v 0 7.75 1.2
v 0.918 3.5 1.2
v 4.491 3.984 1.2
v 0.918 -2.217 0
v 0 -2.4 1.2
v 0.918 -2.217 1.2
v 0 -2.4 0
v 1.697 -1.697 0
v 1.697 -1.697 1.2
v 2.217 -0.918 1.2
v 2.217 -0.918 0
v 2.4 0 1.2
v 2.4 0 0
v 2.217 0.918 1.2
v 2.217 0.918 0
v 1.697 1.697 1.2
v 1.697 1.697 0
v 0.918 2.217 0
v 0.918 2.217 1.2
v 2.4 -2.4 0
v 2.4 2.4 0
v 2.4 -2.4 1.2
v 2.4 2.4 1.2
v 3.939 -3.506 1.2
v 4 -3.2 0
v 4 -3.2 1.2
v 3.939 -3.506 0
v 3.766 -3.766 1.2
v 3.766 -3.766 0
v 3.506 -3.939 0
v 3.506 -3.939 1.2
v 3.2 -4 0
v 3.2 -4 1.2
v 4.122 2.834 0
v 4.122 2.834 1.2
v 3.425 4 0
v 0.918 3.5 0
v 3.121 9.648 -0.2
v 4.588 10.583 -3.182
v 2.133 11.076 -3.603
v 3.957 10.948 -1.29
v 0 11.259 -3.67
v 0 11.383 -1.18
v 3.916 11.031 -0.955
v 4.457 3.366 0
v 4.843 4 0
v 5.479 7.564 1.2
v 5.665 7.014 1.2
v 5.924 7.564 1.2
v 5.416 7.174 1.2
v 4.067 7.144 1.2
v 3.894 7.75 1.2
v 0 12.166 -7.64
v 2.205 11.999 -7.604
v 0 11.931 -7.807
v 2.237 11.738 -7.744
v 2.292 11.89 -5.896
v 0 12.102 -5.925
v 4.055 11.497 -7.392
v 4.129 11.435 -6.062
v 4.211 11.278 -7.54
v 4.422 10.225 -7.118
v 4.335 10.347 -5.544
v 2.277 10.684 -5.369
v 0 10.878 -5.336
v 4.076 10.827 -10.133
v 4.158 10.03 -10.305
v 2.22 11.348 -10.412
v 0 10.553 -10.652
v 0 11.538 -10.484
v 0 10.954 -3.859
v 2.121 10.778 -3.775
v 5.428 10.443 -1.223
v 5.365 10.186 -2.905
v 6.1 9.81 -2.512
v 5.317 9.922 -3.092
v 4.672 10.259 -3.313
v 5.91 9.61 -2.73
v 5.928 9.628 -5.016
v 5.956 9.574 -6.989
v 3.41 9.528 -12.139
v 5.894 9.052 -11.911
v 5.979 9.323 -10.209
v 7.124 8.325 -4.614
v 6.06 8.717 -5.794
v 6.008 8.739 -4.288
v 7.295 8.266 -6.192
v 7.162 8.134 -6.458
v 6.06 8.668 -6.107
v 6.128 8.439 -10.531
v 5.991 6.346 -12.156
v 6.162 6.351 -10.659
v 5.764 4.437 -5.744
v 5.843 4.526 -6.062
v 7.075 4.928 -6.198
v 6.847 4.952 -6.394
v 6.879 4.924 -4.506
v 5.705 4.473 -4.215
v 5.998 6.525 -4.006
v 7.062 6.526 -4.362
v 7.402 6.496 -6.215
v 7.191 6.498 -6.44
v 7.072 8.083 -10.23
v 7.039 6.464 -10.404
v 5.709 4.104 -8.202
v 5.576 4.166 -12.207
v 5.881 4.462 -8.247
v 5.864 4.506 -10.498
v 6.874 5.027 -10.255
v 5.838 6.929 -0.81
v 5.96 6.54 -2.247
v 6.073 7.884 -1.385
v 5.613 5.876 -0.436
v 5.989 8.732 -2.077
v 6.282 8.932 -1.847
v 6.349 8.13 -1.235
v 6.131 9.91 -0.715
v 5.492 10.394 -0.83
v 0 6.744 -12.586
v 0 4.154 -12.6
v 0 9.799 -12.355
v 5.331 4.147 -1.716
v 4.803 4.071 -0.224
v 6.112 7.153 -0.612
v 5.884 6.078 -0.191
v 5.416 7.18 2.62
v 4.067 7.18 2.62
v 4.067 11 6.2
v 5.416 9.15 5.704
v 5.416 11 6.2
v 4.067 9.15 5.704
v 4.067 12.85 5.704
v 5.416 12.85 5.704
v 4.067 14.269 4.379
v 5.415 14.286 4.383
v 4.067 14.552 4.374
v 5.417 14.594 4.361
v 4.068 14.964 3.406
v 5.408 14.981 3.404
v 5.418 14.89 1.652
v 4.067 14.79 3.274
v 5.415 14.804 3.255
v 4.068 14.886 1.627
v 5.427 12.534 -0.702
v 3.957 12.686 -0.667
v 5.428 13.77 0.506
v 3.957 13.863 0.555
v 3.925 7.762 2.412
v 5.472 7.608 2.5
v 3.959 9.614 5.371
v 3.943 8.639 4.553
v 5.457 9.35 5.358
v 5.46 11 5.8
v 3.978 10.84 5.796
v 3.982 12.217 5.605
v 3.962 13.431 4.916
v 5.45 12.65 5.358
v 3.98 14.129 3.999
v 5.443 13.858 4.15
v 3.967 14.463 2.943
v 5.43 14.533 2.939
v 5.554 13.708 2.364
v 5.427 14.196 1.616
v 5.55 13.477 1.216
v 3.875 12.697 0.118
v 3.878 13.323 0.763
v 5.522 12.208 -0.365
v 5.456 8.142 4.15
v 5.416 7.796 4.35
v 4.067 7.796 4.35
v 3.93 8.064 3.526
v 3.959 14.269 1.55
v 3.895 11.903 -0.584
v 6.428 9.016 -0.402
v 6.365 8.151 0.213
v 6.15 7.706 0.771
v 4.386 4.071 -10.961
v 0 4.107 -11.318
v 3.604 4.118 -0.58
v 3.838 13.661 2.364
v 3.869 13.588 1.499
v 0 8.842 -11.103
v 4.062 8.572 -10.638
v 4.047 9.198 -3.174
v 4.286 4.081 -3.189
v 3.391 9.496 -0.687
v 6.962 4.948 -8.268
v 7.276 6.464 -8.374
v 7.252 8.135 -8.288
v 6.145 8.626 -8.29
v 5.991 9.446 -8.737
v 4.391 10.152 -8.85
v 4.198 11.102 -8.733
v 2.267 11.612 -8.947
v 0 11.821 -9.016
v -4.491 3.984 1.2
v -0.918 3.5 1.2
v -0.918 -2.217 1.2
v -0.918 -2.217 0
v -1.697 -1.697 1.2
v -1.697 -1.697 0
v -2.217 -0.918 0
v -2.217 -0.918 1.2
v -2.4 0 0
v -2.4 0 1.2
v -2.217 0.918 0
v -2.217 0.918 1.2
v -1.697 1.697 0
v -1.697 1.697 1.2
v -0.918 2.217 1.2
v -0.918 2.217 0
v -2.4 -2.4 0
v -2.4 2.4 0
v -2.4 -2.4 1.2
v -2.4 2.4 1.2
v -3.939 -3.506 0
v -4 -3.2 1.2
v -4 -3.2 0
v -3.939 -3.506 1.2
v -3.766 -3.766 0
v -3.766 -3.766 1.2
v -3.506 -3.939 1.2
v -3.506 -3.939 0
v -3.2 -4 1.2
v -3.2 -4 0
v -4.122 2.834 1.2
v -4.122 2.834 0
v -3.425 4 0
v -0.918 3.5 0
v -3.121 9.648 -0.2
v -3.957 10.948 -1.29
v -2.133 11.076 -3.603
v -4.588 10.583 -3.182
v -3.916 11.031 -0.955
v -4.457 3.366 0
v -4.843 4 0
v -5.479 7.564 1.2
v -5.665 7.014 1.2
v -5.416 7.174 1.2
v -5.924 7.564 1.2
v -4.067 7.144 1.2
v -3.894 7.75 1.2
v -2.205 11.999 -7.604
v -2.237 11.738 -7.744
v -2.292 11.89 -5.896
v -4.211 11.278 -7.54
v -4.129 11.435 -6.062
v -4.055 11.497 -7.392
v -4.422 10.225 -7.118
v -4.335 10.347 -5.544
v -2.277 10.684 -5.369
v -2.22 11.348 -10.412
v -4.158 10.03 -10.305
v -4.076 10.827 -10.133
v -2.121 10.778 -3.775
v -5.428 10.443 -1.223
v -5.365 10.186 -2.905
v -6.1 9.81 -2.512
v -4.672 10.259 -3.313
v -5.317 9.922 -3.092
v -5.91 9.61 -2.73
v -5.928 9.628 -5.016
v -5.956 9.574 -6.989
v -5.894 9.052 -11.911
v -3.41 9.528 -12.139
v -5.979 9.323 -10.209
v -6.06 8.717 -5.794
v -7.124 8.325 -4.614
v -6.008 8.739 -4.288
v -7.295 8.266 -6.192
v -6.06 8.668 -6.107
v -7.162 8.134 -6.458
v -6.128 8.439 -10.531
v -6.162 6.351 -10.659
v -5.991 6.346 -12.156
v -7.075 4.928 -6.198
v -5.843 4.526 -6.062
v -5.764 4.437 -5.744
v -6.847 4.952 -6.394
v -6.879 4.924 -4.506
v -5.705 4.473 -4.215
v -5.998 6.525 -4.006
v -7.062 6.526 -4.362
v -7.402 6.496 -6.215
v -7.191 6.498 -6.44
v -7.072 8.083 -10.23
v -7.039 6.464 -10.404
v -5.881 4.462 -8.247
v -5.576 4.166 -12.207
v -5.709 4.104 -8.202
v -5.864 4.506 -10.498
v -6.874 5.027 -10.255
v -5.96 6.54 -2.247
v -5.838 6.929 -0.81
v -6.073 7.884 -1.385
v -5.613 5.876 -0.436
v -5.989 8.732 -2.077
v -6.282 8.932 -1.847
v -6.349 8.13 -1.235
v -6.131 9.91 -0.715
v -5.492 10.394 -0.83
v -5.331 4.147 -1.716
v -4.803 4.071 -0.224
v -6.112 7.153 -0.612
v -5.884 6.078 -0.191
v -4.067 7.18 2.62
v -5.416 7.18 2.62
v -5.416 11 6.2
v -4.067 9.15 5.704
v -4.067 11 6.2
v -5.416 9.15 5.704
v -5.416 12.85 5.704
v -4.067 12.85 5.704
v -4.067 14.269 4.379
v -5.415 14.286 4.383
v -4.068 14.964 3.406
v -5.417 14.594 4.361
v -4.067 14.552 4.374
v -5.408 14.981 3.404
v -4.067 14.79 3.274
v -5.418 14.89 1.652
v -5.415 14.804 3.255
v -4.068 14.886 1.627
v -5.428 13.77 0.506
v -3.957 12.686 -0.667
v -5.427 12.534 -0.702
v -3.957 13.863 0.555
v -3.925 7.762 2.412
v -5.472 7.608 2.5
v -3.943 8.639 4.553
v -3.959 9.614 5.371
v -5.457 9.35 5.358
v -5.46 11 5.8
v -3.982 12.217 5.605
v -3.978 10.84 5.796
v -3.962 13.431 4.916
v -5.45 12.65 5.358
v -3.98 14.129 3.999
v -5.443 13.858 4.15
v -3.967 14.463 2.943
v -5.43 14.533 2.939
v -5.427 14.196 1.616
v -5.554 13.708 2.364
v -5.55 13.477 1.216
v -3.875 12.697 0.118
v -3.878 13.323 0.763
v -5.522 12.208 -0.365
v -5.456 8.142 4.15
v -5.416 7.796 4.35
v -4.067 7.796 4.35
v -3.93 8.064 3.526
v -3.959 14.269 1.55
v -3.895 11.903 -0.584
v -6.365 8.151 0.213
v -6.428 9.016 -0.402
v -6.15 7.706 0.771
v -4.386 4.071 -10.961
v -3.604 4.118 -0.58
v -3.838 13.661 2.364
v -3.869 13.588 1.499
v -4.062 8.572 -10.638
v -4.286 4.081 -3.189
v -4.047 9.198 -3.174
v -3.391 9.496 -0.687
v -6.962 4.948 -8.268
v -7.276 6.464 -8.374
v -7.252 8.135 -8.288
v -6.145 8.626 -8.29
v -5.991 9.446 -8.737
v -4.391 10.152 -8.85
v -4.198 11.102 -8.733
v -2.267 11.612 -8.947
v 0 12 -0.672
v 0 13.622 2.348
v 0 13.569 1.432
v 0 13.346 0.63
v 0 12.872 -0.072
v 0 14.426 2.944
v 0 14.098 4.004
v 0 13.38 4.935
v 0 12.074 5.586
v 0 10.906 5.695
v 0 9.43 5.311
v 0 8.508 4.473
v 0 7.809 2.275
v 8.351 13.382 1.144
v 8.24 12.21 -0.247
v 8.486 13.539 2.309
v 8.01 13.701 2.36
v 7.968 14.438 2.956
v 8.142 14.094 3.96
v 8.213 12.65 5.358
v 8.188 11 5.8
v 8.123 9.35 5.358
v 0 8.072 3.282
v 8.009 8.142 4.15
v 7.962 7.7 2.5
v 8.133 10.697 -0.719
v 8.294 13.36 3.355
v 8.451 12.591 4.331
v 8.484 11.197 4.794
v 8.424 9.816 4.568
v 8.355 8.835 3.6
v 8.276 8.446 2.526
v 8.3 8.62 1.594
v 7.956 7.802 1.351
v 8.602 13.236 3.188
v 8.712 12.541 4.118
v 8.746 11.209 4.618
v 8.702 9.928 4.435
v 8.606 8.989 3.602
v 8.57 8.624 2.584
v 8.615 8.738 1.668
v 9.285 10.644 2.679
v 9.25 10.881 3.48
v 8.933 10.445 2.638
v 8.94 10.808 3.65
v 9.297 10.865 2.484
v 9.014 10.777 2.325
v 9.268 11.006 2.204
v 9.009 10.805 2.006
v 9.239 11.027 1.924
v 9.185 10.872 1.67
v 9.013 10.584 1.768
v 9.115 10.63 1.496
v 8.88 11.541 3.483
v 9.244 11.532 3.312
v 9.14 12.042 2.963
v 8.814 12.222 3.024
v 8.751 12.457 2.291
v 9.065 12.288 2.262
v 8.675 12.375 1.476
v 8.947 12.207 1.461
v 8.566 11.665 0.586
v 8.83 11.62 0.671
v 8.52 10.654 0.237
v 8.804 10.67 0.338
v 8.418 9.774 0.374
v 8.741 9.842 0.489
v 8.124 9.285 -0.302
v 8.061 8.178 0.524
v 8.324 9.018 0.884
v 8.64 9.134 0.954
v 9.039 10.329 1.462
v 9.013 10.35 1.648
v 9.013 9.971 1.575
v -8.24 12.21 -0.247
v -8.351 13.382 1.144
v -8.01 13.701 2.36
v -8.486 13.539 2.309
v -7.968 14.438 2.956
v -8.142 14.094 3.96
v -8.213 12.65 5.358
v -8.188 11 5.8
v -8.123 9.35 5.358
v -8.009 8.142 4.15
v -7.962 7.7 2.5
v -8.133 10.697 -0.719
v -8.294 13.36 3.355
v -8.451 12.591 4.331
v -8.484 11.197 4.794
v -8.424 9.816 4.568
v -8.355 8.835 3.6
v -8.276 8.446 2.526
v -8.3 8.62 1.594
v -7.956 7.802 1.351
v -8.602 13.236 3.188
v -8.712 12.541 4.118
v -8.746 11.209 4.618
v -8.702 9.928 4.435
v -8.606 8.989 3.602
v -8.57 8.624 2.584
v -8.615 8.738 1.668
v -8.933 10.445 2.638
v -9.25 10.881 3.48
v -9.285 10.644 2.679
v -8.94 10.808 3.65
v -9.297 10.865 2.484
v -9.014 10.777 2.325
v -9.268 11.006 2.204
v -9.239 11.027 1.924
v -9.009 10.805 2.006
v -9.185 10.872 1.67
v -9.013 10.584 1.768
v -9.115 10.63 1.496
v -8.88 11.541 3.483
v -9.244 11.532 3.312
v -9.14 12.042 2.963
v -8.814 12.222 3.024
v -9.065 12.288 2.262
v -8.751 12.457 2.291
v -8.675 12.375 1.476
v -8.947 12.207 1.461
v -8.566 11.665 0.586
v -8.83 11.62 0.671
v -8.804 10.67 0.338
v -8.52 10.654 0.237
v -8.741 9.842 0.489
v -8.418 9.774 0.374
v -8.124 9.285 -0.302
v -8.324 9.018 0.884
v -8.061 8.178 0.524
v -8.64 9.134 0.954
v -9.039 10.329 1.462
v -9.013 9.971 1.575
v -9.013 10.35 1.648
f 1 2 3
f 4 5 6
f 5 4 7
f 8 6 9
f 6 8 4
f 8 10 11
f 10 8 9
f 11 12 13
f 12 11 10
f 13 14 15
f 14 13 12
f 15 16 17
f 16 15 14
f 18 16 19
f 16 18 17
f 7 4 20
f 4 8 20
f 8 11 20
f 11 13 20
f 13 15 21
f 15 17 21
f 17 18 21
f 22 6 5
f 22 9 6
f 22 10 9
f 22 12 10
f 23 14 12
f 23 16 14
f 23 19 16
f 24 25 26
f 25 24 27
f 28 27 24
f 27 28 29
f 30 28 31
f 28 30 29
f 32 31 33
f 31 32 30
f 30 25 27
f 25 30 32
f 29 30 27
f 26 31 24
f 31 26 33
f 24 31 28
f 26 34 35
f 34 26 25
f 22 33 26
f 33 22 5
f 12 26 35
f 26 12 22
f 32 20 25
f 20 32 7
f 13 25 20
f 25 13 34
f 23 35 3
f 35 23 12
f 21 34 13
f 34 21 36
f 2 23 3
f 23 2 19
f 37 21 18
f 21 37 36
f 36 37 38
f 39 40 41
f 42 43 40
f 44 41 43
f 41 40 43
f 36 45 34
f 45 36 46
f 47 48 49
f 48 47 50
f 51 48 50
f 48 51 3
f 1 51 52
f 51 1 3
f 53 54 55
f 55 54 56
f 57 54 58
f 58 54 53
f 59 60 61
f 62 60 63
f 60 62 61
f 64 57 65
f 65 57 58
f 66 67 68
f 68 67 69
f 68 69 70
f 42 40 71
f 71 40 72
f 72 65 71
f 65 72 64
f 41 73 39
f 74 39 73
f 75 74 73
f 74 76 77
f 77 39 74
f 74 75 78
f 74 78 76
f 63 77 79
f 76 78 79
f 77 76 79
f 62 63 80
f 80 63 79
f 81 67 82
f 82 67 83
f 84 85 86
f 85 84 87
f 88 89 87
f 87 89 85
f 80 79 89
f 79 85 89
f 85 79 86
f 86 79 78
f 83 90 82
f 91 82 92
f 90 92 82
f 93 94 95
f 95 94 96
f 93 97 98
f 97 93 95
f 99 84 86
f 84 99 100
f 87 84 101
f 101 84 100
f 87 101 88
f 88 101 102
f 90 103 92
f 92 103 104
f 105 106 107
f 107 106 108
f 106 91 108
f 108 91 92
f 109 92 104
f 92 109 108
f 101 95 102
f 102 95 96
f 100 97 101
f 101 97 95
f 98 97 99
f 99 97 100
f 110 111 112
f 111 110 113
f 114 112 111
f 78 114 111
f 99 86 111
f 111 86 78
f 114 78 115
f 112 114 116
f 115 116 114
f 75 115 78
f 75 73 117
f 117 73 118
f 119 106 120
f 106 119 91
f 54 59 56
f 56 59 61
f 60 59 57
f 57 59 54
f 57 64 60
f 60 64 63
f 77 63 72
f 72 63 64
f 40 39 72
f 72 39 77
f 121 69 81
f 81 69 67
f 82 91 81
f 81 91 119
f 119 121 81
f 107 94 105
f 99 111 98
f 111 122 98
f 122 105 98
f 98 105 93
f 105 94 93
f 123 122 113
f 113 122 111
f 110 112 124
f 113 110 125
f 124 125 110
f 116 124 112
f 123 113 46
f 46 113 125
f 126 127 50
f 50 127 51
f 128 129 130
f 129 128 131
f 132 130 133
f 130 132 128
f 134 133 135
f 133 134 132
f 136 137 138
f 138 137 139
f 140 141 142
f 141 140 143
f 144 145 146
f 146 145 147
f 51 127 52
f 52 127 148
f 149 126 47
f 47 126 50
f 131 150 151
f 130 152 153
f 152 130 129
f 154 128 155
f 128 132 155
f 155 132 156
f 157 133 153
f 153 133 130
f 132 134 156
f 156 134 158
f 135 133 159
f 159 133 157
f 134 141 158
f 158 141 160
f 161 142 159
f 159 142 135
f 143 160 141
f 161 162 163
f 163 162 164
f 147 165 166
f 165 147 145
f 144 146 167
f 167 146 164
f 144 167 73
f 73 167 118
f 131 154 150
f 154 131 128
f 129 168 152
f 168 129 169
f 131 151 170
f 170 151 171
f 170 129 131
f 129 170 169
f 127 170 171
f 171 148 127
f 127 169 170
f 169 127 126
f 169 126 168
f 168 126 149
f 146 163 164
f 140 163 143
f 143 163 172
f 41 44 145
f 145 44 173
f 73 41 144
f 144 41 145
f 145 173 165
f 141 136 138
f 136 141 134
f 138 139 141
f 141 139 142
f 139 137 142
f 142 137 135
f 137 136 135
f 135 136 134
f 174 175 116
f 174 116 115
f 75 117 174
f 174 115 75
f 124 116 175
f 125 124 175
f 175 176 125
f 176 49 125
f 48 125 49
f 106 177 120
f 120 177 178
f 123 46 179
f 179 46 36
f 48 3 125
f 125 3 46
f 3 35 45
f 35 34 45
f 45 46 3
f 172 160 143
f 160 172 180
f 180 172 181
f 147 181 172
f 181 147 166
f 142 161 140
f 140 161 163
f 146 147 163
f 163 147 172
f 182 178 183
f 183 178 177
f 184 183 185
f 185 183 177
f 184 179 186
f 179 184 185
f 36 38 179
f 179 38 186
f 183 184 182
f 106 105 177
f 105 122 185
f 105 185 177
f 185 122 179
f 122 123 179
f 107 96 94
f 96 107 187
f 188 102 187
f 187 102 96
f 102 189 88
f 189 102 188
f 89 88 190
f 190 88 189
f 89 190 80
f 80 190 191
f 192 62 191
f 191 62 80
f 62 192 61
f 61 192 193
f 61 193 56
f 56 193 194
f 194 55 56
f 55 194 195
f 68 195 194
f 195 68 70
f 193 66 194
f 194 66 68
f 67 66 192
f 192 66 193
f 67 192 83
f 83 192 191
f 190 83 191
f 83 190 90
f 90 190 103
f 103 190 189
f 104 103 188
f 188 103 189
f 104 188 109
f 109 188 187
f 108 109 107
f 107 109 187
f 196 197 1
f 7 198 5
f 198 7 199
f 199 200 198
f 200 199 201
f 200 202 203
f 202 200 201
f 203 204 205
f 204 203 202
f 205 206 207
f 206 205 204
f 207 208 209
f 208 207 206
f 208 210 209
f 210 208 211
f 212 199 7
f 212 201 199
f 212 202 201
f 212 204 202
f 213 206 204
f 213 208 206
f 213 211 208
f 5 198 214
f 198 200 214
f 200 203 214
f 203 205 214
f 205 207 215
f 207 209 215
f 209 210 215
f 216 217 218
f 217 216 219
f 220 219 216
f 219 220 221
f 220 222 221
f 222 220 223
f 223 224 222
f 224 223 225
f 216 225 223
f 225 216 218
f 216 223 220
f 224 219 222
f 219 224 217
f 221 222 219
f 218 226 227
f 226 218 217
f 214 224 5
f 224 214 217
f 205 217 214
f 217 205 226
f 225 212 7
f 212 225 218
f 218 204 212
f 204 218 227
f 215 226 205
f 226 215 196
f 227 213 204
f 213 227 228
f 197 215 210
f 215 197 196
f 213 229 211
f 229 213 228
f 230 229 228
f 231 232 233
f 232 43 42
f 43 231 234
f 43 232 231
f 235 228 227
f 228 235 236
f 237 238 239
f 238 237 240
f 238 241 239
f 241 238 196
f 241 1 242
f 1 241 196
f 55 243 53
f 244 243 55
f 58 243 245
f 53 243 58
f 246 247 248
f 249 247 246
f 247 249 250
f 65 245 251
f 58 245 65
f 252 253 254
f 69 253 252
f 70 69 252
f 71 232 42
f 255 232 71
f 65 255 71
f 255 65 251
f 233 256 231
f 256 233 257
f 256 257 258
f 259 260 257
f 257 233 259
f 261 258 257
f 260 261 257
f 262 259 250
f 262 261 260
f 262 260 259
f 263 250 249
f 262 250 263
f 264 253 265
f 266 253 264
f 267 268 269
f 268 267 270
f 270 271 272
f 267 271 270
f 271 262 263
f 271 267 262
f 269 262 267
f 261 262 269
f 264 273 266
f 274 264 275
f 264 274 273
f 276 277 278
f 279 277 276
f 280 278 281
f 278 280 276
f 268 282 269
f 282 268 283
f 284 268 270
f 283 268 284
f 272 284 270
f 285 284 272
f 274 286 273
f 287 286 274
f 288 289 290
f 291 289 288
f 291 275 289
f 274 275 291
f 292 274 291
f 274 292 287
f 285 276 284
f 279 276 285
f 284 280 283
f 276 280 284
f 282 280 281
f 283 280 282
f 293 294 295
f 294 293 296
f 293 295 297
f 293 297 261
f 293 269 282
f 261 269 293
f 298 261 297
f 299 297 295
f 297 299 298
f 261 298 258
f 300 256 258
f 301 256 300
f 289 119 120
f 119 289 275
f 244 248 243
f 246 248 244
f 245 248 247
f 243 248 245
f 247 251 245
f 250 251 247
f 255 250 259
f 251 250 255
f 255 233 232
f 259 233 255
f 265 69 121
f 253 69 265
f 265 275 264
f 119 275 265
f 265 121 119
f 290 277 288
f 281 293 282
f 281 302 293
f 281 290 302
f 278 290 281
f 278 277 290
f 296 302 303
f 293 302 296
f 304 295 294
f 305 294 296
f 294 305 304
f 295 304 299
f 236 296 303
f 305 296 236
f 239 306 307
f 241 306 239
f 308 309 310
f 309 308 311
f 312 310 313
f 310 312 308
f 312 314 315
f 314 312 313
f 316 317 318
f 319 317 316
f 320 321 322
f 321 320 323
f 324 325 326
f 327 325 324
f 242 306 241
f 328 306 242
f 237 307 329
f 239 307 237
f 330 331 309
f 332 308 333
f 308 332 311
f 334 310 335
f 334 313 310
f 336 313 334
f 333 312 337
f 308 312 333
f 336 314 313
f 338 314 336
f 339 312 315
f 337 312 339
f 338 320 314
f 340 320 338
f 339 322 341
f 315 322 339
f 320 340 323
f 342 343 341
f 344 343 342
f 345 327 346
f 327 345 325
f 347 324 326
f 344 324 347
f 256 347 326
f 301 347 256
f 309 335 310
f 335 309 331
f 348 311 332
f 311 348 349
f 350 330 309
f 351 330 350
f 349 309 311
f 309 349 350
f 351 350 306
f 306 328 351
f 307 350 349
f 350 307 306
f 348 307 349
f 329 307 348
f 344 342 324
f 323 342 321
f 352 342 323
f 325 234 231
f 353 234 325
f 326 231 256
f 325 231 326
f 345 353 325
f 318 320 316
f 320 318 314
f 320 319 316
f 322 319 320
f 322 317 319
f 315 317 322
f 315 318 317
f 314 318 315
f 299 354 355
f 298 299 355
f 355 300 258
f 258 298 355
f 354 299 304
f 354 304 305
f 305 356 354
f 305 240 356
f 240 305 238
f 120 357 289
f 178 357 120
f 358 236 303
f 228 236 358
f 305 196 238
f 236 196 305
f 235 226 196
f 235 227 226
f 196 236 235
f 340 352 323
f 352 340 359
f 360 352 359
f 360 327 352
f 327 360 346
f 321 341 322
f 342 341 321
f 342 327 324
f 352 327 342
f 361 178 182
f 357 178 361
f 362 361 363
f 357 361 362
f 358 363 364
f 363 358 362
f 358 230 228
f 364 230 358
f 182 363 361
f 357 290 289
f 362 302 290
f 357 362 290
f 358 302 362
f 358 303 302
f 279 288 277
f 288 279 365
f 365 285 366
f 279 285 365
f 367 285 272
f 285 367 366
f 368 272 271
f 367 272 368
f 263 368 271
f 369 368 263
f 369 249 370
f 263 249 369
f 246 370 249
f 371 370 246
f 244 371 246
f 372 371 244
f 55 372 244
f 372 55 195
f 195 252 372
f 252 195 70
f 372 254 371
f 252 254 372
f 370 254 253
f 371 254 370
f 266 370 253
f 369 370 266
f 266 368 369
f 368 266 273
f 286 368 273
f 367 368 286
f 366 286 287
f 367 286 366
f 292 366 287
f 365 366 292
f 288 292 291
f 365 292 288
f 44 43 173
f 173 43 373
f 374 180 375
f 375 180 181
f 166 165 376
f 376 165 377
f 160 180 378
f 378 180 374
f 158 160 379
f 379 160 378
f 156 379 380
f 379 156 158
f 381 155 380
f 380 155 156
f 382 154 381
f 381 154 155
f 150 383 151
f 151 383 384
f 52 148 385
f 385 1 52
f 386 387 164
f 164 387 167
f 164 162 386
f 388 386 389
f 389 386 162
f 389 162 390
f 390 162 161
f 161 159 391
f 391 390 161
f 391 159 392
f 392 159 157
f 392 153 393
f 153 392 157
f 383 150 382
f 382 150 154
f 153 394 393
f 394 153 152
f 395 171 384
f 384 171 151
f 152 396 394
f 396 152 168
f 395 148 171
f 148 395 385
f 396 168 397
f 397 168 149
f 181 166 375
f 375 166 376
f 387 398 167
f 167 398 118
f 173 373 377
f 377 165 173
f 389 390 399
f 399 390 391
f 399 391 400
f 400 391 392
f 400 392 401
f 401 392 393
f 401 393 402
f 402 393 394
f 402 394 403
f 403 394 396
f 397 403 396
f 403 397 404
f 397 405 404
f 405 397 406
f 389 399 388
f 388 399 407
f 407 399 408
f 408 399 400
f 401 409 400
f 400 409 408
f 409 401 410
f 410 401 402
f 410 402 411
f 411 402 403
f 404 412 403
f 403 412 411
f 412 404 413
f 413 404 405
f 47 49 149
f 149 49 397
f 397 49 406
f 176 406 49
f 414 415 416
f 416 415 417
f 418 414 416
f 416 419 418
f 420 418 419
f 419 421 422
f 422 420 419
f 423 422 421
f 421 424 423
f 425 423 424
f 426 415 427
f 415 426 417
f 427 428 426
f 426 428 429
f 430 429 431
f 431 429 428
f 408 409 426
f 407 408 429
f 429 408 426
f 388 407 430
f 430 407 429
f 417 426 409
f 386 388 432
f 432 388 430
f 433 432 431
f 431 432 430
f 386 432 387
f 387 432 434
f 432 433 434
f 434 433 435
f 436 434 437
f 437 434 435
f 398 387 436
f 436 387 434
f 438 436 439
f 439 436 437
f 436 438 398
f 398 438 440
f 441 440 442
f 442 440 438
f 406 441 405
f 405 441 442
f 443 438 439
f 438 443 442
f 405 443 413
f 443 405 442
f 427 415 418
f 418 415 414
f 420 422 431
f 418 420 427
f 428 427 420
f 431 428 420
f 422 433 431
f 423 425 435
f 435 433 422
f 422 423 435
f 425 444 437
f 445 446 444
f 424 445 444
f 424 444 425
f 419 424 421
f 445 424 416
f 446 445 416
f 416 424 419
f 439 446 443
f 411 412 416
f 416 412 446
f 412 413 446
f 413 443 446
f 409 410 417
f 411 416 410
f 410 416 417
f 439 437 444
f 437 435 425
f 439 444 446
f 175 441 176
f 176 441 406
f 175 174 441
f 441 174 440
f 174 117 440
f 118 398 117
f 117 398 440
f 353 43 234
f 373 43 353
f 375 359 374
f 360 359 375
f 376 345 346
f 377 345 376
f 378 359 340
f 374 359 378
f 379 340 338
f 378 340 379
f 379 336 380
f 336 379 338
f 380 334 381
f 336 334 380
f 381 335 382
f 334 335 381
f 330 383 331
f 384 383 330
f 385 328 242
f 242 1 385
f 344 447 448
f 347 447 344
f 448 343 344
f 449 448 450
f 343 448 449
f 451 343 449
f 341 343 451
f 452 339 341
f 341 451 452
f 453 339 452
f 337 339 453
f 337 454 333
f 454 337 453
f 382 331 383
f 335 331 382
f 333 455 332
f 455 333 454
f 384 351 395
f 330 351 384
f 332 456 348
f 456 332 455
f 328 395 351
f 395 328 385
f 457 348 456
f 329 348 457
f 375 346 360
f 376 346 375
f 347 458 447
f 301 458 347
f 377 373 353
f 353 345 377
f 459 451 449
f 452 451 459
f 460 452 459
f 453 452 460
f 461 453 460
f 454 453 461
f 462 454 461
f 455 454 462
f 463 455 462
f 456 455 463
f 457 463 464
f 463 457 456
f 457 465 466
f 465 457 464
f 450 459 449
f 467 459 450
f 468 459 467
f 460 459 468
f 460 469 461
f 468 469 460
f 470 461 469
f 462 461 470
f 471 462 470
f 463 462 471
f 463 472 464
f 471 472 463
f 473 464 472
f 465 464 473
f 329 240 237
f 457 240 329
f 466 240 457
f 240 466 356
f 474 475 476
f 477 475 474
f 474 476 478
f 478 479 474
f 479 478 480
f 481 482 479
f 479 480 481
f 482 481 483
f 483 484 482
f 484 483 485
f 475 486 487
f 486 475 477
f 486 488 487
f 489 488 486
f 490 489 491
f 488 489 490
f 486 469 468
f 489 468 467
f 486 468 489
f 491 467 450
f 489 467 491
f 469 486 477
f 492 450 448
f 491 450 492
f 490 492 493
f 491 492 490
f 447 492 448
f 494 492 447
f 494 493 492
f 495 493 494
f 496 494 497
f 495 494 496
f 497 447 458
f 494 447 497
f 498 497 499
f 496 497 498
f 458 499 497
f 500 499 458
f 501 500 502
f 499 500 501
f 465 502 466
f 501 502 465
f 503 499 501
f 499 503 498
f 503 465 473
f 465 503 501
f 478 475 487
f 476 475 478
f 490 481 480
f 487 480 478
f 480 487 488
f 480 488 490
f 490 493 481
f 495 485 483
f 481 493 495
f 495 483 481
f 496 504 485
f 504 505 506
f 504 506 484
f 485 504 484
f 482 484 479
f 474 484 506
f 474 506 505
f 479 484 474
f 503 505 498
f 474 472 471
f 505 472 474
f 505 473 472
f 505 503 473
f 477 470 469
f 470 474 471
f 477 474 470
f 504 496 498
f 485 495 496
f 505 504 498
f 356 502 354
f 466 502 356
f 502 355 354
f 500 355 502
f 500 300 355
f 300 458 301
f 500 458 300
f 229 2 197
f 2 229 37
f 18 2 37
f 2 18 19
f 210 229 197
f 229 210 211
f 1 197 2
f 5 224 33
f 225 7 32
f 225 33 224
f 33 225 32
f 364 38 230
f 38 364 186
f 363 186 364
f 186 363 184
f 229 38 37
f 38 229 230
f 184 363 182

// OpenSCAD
use <../lib.scad>
use <../p/box3u2p.scad>
use <../p/rect2p.scad>
use <s/26073s01.scad>
use <s/26073s02.scad>
$fa=1; $fs=0.2;
function ldraw_lib__26073p04(realsolid=false) = [
// 0 Minifig Backpack with Three Pouches and Blue Bedroll Pattern
// 0 Name: 26073p04.dat
// 0 Author: Gerald Lasser [GeraldLasser]
// 0 !LDRAW_ORG Part UPDATE 2022-04
// 0 !LICENSE Licensed under CC BY 2.0 and CC BY 4.0 : see CAreadme.txt
// 
// 0 BFC CERTIFY CCW
  [0,"BFC","CERTIFY"],
  [0,"BFC","CCW"],
// 
// 0 !CATEGORY Minifig Neckwear
// 
// 0 !HISTORY 2022-07-18 [PTadmin] Official Update 2022-04
// 
// 
// 1 16 0 0 0 1 0 0 0 1 0 0 0 1 s\26073s01.dat
  [1,16,0,0,0,1,0,0,0,1,0,0,0,1, ldraw_lib__s__26073s01(realsolid)],
// 1 16 0 0 0 -1 0 0 0 1 0 0 0 1 s\26073s01.dat
  [1,16,0,0,0,-1,0,0,0,1,0,0,0,1, ldraw_lib__s__26073s01(realsolid)],
// 1 1 0 0 0 1 0 0 0 1 0 0 0 1 s\26073s02.dat
  [1,1,0,0,0,1,0,0,0,1,0,0,0,1, ldraw_lib__s__26073s02(realsolid)],
// 1 1 0 0 0 -1 0 0 0 1 0 0 0 1 s\26073s02.dat
  [1,1,0,0,0,-1,0,0,0,1,0,0,0,1, ldraw_lib__s__26073s02(realsolid)],
// 
// 0 BFC INVERTNEXT
  [0,"BFC","INVERTNEXT"],
// 1 16 0 -1.5 5.5434 0 0 2.2962 1.5 0 0 0 3.2066 0 box3u2p.dat
  [1,16,0,-1.5,5.5434,0,0,2.2962,1.5,0,0,0,3.2066,0, ldraw_lib__box3u2p(realsolid)],
// 3 16 0 -3 19.374 -2.2962 -3 8.75 2.2962 -3 8.75
  [3,16,0,-3,19.374,-2.2962,-3,8.75,2.2962,-3,8.75],
// 3 16 0 -3 -6 -8 -3 -10 8 -3 -10
  [3,16,0,-3,-6,-8,-3,-10,8,-3,-10],
// 3 16 -8 0 -10 0 0 -6 8 0 -10
  [3,16,-8,0,-10,0,0,-6,8,0,-10],
// 1 16 0 -1.5 -10 -8 0 0 0 0 1.5 0 1 0 rect2p.dat
  [1,16,0,-1.5,-10,-8,0,0,0,0,1.5,0,1,0, ldraw_lib__rect2p(realsolid)],
// 2 24 7.802 .499 24.119 -7.802 .499 24.119
  [2,24,7.802,.499,24.119,-7.802,.499,24.119],
// 
// 4 16 7.802 .499 24.119 -7.802 .499 24.119 -8.477 1.717 23.739 8.477 1.717 23.739
  [4,16,7.802,.499,24.119,-7.802,.499,24.119,-8.477,1.717,23.739,8.477,1.717,23.739],
// 4 16 10.117 7.934 22.995 8.477 1.717 23.739 -8.477 1.717 23.739 -10.117 7.934 22.995
  [4,16,10.117,7.934,22.995,8.477,1.717,23.739,-8.477,1.717,23.739,-10.117,7.934,22.995],
// 4 16 2.2962 0 8.75 -2.2962 0 8.75 -7.802 .499 24.119 7.802 .499 24.119
  [4,16,2.2962,0,8.75,-2.2962,0,8.75,-7.802,.499,24.119,7.802,.499,24.119],
// 3 16 10.117 7.934 22.995 -10.117 7.934 22.995 0 27.758 22.106
  [3,16,10.117,7.934,22.995,-10.117,7.934,22.995,0,27.758,22.106],
// 5 24 8.477 1.717 23.739 -8.477 1.717 23.739 7.802 .499 24.119 10.117 7.934 22.995
  [5,24,8.477,1.717,23.739,-8.477,1.717,23.739,7.802,.499,24.119,10.117,7.934,22.995],
// 5 24 -10.117 7.934 22.995 10.117 7.934 22.995 8.477 1.717 23.739 10.156 26.595 21.431
  [5,24,-10.117,7.934,22.995,10.117,7.934,22.995,8.477,1.717,23.739,10.156,26.595,21.431],
// 5 24 10.117 7.934 22.995 0 27.758 22.106 10.156 26.595 21.431 -10.117 7.934 22.995
  [5,24,10.117,7.934,22.995,0,27.758,22.106,10.156,26.595,21.431,-10.117,7.934,22.995],
// 5 24 0 27.758 22.106 -10.117 7.934 22.995 10.117 7.934 22.995 -10.156 26.595 21.431
  [5,24,0,27.758,22.106,-10.117,7.934,22.995,10.117,7.934,22.995,-10.156,26.595,21.431],
// 
// 0 // Seam
// 5 24 0 31.466 16.86 0 31.501 10.384 -14.977 30.389 15.864 13.94 30.517 10.414
  [5,24,0,31.466,16.86,0,31.501,10.384,-14.977,30.389,15.864,13.94,30.517,10.414],
// 5 24 0 30.888 24.497 0 31.466 16.86 8.525 30.348 23.819 -8.525 30.348 23.819
  [5,24,0,30.888,24.497,0,31.466,16.86,8.525,30.348,23.819,-8.525,30.348,23.819],
// 5 24 0 26.629 26.383 0 30.888 24.497 8.525 30.348 23.819 -8.525 30.348 23.819
  [5,24,0,26.629,26.383,0,30.888,24.497,8.525,30.348,23.819,-8.525,30.348,23.819],
// 5 24 0 26.629 26.383 0 26.211 28.844 5.549 26.03 28.371 -5.549 26.03 28.371
  [5,24,0,26.629,26.383,0,26.211,28.844,5.549,26.03,28.371,-5.549,26.03,28.371],
// 5 24 0 22.541 29.553 0 26.211 28.844 -5.667 22.367 29.03 5.549 26.03 28.371
  [5,24,0,22.541,29.553,0,26.211,28.844,-5.667,22.367,29.03,5.549,26.03,28.371],
// 5 24 0 22.541 29.553 0 19.518 29.827 -5.667 22.367 29.03 5.592 19.361 29.344
  [5,24,0,22.541,29.553,0,19.518,29.827,-5.667,22.367,29.03,5.592,19.361,29.344],
// 5 24 0 19.518 29.827 0 19.101 30.416 -5.512 19.01 29.997 5.512 19.01 29.997
  [5,24,0,19.518,29.827,0,19.101,30.416,-5.512,19.01,29.997,5.512,19.01,29.997],
// 5 24 0 14.812 30.254 0 19.101 30.416 5.512 19.01 29.997 -5.512 19.01 29.997
  [5,24,0,14.812,30.254,0,19.101,30.416,5.512,19.01,29.997,-5.512,19.01,29.997],
// 5 24 0 13.34 27.194 0 14.812 30.254 5.731 14.739 29.726 -5.731 14.739 29.726
  [5,24,0,13.34,27.194,0,14.812,30.254,5.731,14.739,29.726,-5.731,14.739,29.726],
// 5 24 0 13.34 27.194 0 9.647 27.386 5.303 9.437 26.946 -5.693 13.422 26.709
  [5,24,0,13.34,27.194,0,9.647,27.386,5.303,9.437,26.946,-5.693,13.422,26.709],
// 5 24 0 9.647 27.386 0 9.174 28.147 5.332 9.008 27.69 -5.332 9.008 27.69
  [5,24,0,9.647,27.386,0,9.174,28.147,5.332,9.008,27.69,-5.332,9.008,27.69],
// 5 24 0 9.174 28.147 0 2.95 28.458 -5.332 9.008 27.69 5.332 9.008 27.69
  [5,24,0,9.174,28.147,0,2.95,28.458,-5.332,9.008,27.69,5.332,9.008,27.69],
// 5 24 0 1.68 29.999 0 2.95 28.458 -9.738 1.231 29.578 9.738 1.231 29.578
  [5,24,0,1.68,29.999,0,2.95,28.458,-9.738,1.231,29.578,9.738,1.231,29.578],
// 5 24 0 .179 32.18 0 1.68 29.999 9.687 -.296 31.742 -9.738 1.231 29.578
  [5,24,0,.179,32.18,0,1.68,29.999,9.687,-.296,31.742,-9.738,1.231,29.578],
// 5 24 0 -1.576 33.365 0 .179 32.18 9.687 -.296 31.742 -9.687 -.296 31.742
  [5,24,0,-1.576,33.365,0,.179,32.18,9.687,-.296,31.742,-9.687,-.296,31.742],
// 5 24 0 -3.579 33.922 0 -1.576 33.365 9.696 -1.907 33.307 -9.696 -1.907 33.307
  [5,24,0,-3.579,33.922,0,-1.576,33.365,9.696,-1.907,33.307,-9.696,-1.907,33.307],
// 5 24 0 -3.579 33.922 0 -5.871 34.055 9.594 -5.911 34.153 -9.594 -5.911 34.153
  [5,24,0,-3.579,33.922,0,-5.871,34.055,9.594,-5.911,34.153,-9.594,-5.911,34.153],
// 5 24 0 -5.871 34.055 0 -7.36 36.065 9.594 -5.911 34.153 -9.594 -5.911 34.153
  [5,24,0,-5.871,34.055,0,-7.36,36.065,9.594,-5.911,34.153,-9.594,-5.911,34.153],
// 5 24 0 -10.009 35.245 0 -7.36 36.065 9.918 -7.358 36.157 -9.918 -7.358 36.157
  [5,24,0,-10.009,35.245,0,-7.36,36.065,9.918,-7.358,36.157,-9.918,-7.358,36.157],
// 5 24 0 -12.337 33.451 0 -10.009 35.245 9.904 -12.291 33.578 -9.95 -9.997 35.323
  [5,24,0,-12.337,33.451,0,-10.009,35.245,9.904,-12.291,33.578,-9.95,-9.997,35.323],
// 5 24 0 -13.966 30.184 0 -12.337 33.451 9.956 -14.012 30.543 -9.956 -14.012 30.543
  [5,24,0,-13.966,30.184,0,-12.337,33.451,9.956,-14.012,30.543,-9.956,-14.012,30.543],
// 5 24 0 -14.238 27.264 0 -13.966 30.184 -9.946 -14.489 27.1 9.946 -14.489 27.1
  [5,24,0,-14.238,27.264,0,-13.966,30.184,-9.946,-14.489,27.1,9.946,-14.489,27.1],
// 5 24 0 -5.688 19.523 0 -3 19.374 -9.812 -6.029 19.404 9.735 -3 19.374
  [5,24,0,-5.688,19.523,0,-3,19.374,-9.812,-6.029,19.404,9.735,-3,19.374],
// 5 24 0 -5.688 19.523 0 -8.205 20.18 -9.825 -8.814 20.16 9.812 -6.029 19.404
  [5,24,0,-5.688,19.523,0,-8.205,20.18,-9.825,-8.814,20.16,9.812,-6.029,19.404],
// 5 24 0 -8.205 20.18 0 -11.183 21.269 -9.825 -8.814 20.16 9.825 -8.814 20.16
  [5,24,0,-8.205,20.18,0,-11.183,21.269,-9.825,-8.814,20.16,9.825,-8.814,20.16],
// 5 24 0 -11.183 21.269 0 -13.278 23.574 -9.857 -11.382 21.598 9.857 -11.382 21.598
  [5,24,0,-11.183,21.269,0,-13.278,23.574,-9.857,-11.382,21.598,9.857,-11.382,21.598],
// 5 24 0 -13.278 23.574 0 -14.238 27.264 9.897 -13.428 24.034 -9.897 -13.428 24.034
  [5,24,0,-13.278,23.574,0,-14.238,27.264,9.897,-13.428,24.034,-9.897,-13.428,24.034],
// 5 24 0 28.295 10.267 0 31.501 10.384 10.966 27.403 10.178 -10.966 27.403 10.178
  [5,24,0,28.295,10.267,0,31.501,10.384,10.966,27.403,10.178,-10.966,27.403,10.178],
// 5 24 0 27.758 22.106 0 28.295 10.267 -10.156 26.595 21.431 10.156 26.595 21.431
  [5,24,0,27.758,22.106,0,28.295,10.267,-10.156,26.595,21.431,10.156,26.595,21.431],
// 
// 5 24 -7.802 .499 24.119 -2.2962 0 8.75 -8.563 0 10 7.802 .499 24.119
  [5,24,-7.802,.499,24.119,-2.2962,0,8.75,-8.563,0,10,7.802,.499,24.119],
// 5 24 7.802 .499 24.119 2.2962 0 8.75 -7.802 .499 24.119 8.563 0 10
  [5,24,7.802,.499,24.119,2.2962,0,8.75,-7.802,.499,24.119,8.563,0,10],
];
module ldraw_lib__26073p04(step=0, col=false, unit=2/5, alt=false, line=0.2, solid=!$preview)
    makepoly(ldraw_lib__26073p04(solid), step=step, col=col, unit=unit, alt=alt, line=line, solid=solid);
ldraw_lib__26073p04(line=0.2);
